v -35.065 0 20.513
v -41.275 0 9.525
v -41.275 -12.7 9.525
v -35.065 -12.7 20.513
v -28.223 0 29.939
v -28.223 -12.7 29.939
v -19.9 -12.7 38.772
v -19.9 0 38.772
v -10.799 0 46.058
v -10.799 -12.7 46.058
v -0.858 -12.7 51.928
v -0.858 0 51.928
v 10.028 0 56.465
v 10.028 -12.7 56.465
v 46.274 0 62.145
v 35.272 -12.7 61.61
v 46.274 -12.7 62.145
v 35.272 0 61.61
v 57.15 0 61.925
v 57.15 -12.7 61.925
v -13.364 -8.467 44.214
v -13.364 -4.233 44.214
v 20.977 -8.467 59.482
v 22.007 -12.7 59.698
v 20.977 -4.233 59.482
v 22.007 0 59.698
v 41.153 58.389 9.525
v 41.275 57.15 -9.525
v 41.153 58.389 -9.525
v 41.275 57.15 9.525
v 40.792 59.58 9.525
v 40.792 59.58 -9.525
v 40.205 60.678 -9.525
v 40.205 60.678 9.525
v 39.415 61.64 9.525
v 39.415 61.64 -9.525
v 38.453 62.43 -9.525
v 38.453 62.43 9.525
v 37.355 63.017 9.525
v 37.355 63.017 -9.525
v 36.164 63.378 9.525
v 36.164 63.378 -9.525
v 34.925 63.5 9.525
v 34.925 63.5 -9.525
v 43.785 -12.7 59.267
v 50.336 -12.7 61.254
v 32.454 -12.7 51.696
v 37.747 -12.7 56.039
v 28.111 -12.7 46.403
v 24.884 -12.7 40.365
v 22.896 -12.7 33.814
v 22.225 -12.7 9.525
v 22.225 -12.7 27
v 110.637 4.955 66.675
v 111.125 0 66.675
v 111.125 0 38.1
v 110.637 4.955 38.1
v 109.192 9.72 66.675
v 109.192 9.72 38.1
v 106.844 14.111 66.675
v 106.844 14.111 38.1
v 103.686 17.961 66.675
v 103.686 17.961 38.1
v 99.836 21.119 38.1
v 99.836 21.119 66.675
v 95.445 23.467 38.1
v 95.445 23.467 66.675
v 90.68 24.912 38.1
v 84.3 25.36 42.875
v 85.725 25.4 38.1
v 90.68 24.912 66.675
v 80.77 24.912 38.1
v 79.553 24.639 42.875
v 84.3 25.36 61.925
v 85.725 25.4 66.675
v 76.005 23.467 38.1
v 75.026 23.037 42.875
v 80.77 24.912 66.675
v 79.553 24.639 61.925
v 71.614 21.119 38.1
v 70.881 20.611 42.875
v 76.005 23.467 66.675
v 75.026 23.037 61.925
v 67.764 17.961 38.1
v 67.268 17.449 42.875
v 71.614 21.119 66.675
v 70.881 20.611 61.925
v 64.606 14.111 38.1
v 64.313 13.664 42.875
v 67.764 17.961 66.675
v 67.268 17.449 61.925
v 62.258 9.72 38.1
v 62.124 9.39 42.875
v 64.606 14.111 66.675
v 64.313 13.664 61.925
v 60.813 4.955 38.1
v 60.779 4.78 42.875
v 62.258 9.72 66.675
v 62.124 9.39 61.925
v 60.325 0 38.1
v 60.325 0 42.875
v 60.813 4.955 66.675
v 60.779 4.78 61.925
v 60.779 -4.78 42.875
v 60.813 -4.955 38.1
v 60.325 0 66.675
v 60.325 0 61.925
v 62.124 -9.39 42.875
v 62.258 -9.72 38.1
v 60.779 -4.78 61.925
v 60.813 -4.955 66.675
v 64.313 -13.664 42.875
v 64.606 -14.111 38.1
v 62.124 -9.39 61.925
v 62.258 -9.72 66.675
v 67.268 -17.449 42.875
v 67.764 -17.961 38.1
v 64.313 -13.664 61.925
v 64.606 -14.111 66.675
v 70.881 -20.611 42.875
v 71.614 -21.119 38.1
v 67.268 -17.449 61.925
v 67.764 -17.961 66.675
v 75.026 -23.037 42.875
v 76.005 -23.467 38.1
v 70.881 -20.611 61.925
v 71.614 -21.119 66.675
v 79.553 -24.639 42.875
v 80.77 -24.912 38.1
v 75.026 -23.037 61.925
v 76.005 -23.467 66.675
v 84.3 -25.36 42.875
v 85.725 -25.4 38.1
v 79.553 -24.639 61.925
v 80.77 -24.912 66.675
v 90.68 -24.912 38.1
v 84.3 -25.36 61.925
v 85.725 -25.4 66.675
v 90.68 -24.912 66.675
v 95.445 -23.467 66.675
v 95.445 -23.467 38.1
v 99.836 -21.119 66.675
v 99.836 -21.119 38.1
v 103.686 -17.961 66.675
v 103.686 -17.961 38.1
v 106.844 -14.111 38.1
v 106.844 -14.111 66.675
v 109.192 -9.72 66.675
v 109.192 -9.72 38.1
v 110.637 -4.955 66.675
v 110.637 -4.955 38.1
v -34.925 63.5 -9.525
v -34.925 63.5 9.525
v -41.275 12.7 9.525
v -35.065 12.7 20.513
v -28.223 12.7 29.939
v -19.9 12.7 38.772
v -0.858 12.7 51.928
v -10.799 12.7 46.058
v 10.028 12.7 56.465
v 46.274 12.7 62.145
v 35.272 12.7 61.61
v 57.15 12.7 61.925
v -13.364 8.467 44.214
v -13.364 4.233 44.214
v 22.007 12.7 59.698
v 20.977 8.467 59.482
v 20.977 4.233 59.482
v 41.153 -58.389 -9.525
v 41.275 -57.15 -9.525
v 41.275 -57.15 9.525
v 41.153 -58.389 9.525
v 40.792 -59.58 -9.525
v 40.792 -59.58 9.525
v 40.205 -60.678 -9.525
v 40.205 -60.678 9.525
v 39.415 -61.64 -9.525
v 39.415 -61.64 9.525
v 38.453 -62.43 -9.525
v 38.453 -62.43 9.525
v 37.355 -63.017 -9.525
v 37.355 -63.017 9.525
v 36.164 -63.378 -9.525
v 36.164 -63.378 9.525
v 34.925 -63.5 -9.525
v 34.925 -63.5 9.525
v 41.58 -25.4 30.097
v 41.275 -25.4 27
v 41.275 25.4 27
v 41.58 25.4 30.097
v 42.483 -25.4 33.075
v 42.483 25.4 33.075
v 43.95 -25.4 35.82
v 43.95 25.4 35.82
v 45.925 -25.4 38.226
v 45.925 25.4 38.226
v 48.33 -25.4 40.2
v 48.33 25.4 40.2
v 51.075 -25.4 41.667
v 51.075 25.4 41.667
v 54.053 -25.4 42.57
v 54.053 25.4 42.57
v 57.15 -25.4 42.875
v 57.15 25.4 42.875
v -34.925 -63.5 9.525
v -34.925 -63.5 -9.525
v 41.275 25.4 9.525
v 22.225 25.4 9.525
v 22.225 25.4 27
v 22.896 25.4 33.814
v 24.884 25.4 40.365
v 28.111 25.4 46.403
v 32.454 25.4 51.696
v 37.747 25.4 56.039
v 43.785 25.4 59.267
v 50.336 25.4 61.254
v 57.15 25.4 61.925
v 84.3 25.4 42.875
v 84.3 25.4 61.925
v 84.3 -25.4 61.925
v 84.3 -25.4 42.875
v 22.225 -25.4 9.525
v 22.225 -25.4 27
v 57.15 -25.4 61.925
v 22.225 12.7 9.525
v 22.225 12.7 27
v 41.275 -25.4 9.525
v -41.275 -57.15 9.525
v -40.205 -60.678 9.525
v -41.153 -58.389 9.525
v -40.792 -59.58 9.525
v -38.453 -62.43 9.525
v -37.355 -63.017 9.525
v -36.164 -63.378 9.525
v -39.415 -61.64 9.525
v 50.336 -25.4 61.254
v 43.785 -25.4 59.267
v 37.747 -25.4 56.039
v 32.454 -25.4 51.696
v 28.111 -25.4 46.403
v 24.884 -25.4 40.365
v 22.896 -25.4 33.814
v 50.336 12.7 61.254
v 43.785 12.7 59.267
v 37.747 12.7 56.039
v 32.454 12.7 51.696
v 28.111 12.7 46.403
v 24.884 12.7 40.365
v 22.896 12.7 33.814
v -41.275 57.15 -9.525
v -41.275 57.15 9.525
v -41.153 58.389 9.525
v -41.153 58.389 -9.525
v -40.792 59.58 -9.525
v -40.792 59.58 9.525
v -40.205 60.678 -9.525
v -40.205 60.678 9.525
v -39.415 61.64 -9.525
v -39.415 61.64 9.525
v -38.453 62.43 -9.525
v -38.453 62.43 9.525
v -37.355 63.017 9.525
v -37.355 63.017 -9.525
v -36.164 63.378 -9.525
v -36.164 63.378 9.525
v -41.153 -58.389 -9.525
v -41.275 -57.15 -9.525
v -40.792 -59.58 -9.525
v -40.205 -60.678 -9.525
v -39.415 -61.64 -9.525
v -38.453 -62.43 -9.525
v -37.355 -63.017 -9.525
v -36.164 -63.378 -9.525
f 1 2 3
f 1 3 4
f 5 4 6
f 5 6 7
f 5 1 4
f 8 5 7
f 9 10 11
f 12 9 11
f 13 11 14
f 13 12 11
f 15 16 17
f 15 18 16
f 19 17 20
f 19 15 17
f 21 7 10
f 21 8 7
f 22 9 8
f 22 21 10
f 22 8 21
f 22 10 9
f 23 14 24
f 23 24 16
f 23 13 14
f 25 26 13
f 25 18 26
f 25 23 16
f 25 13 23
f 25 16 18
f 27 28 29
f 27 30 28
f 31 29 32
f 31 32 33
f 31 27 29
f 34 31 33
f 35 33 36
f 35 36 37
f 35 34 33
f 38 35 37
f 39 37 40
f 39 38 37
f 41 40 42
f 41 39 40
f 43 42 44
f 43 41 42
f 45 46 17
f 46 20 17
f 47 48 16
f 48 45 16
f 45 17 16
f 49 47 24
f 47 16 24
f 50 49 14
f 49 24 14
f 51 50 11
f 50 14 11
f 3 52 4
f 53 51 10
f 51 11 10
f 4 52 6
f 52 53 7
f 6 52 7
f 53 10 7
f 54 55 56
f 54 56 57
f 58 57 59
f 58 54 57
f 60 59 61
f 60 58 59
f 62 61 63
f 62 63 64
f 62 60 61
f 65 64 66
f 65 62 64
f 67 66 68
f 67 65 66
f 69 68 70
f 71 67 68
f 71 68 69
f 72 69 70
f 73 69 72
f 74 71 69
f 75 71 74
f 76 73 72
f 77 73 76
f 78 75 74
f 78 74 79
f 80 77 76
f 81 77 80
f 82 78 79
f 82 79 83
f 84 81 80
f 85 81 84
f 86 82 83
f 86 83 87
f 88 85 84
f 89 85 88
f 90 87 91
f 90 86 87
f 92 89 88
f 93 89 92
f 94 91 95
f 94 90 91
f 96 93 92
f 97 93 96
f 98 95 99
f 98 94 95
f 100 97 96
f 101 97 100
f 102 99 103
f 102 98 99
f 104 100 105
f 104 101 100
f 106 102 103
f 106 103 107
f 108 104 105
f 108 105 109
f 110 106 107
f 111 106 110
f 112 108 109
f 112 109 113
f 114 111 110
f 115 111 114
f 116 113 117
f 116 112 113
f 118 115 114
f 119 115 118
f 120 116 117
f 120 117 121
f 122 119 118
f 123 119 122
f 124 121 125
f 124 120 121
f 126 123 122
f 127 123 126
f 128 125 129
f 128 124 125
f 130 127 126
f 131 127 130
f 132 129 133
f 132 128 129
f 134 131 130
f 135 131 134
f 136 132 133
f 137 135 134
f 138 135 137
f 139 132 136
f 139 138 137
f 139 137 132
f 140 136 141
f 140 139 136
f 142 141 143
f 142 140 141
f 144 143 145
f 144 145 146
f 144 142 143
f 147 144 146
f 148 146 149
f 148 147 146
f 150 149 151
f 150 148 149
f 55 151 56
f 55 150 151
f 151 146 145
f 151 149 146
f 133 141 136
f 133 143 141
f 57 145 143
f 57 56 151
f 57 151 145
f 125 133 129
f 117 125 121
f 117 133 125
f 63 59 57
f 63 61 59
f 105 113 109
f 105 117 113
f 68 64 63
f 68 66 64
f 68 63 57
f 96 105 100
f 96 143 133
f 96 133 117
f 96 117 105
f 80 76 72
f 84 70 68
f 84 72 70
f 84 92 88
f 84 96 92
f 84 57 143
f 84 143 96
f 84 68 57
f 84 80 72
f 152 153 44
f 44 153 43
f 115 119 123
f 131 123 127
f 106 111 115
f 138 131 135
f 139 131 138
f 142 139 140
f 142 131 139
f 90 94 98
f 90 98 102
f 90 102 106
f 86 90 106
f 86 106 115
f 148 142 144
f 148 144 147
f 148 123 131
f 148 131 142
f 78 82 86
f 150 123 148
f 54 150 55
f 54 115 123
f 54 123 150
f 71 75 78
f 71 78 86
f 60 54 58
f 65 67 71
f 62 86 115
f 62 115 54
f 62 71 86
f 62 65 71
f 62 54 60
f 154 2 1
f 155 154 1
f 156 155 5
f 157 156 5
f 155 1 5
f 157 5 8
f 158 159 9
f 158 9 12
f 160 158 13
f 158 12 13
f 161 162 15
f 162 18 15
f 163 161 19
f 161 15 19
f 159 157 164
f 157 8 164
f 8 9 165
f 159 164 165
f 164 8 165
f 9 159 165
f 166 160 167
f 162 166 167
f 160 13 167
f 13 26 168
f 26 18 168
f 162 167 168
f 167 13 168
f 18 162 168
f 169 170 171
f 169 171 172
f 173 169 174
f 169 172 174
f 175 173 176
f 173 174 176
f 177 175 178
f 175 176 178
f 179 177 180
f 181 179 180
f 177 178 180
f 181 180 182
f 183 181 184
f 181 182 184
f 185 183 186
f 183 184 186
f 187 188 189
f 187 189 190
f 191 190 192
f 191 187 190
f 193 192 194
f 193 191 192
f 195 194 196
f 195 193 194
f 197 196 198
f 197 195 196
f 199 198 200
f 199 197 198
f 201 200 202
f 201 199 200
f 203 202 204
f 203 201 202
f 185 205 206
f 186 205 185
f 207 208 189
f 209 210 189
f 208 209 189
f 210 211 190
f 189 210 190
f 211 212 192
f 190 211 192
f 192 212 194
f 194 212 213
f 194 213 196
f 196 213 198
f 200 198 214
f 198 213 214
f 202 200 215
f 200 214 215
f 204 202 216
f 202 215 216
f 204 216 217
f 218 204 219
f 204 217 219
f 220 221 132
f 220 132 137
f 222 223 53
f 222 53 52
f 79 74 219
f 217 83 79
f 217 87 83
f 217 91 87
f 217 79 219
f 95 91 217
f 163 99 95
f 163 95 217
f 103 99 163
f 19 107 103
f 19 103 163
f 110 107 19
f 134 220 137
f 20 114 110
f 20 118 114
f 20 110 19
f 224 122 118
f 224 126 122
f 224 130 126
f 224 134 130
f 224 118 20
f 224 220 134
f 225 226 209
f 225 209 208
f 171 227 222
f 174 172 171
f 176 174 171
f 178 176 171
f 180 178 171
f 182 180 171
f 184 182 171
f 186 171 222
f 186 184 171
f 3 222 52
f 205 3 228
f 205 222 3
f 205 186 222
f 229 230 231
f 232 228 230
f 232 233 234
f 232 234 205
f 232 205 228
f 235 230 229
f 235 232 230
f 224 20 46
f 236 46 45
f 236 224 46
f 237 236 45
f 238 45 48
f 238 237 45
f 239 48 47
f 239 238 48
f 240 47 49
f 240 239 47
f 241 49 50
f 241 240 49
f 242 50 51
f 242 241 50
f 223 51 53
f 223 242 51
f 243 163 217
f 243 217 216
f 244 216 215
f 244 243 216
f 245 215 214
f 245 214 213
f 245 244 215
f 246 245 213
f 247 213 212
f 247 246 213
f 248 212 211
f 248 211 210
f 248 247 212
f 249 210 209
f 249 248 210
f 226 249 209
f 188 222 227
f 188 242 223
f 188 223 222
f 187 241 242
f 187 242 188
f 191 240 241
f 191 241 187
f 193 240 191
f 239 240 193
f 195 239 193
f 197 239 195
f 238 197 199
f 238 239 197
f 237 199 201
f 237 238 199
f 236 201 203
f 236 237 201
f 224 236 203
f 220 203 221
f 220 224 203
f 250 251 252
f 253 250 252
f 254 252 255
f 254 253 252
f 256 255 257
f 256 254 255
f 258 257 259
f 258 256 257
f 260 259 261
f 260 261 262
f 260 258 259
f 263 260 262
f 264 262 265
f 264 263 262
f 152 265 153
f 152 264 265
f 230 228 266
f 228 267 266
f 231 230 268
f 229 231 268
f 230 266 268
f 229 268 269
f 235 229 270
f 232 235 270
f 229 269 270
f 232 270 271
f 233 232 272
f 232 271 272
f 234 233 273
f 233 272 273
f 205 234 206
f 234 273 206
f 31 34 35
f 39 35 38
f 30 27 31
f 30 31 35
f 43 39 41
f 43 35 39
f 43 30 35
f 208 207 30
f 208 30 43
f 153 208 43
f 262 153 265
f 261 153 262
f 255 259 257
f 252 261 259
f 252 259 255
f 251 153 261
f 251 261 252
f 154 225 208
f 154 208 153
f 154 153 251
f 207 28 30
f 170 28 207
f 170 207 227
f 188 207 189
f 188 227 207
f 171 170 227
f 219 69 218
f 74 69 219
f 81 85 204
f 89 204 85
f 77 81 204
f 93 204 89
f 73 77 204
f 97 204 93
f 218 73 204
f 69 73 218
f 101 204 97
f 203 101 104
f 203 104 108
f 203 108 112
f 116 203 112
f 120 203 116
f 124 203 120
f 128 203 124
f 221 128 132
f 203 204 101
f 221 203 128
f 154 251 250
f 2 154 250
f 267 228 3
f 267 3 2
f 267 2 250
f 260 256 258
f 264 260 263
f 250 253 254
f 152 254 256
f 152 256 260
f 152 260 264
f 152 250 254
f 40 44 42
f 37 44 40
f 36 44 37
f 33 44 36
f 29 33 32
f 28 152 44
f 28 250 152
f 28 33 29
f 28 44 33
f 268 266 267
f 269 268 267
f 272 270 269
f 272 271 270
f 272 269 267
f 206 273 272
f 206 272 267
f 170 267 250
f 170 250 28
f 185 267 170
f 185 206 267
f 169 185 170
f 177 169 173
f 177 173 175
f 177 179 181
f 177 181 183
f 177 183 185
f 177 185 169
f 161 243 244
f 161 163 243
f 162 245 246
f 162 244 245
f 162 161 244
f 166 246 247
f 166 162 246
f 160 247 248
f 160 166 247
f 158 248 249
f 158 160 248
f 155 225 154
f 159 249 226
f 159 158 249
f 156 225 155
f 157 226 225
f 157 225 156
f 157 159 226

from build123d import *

# Parameters (mm, degrees)
F1_DEPTH = 63.5
F0_W     = 23.975106
F0_H     = 19.05
F2_DEPTH = 25.4
F3_DEPTH = 12.7
F5_R     = 6.35


with BuildPart() as f1:
    # F0 (on Front) → F1 (new body, symmetric)
    with BuildSketch(Plane.XZ):
        Polygon((-41.275, 9.525), (-41.275, -9.525), (41.275, -9.525), (41.275, 9.525), (22.225, 9.525), align=None)
    extrude(amount=F1_DEPTH, both=True)

    # F0 (on Front) → F2 (join, symmetric)
    with BuildSketch(Plane.XZ):
        with BuildLine():
            Line((22.225, 9.525), (41.275, 9.525))
            Line((41.275, 9.525), (41.275, 27.0002))
            ThreePointArc((41.275, 27.0002), (45.92468, 38.22552), (57.15, 42.8752))
            Line((57.15, 42.8752), (60.325, 42.8752))
            Line((60.325, 42.8752), (60.325, 61.9252))
            Line((60.325, 61.9252), (57.15, 61.9252))
            ThreePointArc((57.15, 61.9252), (32.454296, 51.695904), (22.225, 27.0002))
            Line((22.225, 27.0002), (22.225, 9.525))
        make_face()
        with Locations((72.312553, 52.4002)):
            Rectangle(F0_W, F0_H)
    extrude(amount=F2_DEPTH, both=True)

    # F0 (on Front) → F3 (join, symmetric)
    with BuildSketch(Plane.XZ):
        with BuildLine():
            add(Edge.make_bspline(
                [(-41.275, 9.525), (-18.111696, 56.123264), (21.593637, 63.694689), (57.15, 61.9252)],
                knots=[0, 0, 0, 0, 111.504536, 111.504536, 111.504536, 111.504536], degree=3))
            Line((-41.275, 9.525), (22.225, 9.525))
            Line((22.225, 9.525), (22.225, 27.0002))
            ThreePointArc((22.225, 27.0002), (32.454296, 51.695904), (57.15, 61.9252))
        make_face()
    extrude(amount=F3_DEPTH, both=True)

    # F0 (on Front) → F4 (revolve)
    with BuildSketch(Plane.XZ):
        Polygon((111.125, 66.675), (85.725, 66.675), (85.725, 52.3875), (85.725, 38.1), (111.125, 38.1), align=None)
    revolve(axis=Axis((85.725, 0, 61.228485), (0, 0, 1)))

    # F5
    f5_edges = [f1.edges().sort_by_distance(p)[0] for p in [
        (41.275, -63.5, 0),
        (-41.275, -63.5, 0),
        (41.275, 63.5, 0),
        (-41.275, 63.5, 0),
    ]]
    fillet(f5_edges, radius=F5_R)


solid = f1.part
